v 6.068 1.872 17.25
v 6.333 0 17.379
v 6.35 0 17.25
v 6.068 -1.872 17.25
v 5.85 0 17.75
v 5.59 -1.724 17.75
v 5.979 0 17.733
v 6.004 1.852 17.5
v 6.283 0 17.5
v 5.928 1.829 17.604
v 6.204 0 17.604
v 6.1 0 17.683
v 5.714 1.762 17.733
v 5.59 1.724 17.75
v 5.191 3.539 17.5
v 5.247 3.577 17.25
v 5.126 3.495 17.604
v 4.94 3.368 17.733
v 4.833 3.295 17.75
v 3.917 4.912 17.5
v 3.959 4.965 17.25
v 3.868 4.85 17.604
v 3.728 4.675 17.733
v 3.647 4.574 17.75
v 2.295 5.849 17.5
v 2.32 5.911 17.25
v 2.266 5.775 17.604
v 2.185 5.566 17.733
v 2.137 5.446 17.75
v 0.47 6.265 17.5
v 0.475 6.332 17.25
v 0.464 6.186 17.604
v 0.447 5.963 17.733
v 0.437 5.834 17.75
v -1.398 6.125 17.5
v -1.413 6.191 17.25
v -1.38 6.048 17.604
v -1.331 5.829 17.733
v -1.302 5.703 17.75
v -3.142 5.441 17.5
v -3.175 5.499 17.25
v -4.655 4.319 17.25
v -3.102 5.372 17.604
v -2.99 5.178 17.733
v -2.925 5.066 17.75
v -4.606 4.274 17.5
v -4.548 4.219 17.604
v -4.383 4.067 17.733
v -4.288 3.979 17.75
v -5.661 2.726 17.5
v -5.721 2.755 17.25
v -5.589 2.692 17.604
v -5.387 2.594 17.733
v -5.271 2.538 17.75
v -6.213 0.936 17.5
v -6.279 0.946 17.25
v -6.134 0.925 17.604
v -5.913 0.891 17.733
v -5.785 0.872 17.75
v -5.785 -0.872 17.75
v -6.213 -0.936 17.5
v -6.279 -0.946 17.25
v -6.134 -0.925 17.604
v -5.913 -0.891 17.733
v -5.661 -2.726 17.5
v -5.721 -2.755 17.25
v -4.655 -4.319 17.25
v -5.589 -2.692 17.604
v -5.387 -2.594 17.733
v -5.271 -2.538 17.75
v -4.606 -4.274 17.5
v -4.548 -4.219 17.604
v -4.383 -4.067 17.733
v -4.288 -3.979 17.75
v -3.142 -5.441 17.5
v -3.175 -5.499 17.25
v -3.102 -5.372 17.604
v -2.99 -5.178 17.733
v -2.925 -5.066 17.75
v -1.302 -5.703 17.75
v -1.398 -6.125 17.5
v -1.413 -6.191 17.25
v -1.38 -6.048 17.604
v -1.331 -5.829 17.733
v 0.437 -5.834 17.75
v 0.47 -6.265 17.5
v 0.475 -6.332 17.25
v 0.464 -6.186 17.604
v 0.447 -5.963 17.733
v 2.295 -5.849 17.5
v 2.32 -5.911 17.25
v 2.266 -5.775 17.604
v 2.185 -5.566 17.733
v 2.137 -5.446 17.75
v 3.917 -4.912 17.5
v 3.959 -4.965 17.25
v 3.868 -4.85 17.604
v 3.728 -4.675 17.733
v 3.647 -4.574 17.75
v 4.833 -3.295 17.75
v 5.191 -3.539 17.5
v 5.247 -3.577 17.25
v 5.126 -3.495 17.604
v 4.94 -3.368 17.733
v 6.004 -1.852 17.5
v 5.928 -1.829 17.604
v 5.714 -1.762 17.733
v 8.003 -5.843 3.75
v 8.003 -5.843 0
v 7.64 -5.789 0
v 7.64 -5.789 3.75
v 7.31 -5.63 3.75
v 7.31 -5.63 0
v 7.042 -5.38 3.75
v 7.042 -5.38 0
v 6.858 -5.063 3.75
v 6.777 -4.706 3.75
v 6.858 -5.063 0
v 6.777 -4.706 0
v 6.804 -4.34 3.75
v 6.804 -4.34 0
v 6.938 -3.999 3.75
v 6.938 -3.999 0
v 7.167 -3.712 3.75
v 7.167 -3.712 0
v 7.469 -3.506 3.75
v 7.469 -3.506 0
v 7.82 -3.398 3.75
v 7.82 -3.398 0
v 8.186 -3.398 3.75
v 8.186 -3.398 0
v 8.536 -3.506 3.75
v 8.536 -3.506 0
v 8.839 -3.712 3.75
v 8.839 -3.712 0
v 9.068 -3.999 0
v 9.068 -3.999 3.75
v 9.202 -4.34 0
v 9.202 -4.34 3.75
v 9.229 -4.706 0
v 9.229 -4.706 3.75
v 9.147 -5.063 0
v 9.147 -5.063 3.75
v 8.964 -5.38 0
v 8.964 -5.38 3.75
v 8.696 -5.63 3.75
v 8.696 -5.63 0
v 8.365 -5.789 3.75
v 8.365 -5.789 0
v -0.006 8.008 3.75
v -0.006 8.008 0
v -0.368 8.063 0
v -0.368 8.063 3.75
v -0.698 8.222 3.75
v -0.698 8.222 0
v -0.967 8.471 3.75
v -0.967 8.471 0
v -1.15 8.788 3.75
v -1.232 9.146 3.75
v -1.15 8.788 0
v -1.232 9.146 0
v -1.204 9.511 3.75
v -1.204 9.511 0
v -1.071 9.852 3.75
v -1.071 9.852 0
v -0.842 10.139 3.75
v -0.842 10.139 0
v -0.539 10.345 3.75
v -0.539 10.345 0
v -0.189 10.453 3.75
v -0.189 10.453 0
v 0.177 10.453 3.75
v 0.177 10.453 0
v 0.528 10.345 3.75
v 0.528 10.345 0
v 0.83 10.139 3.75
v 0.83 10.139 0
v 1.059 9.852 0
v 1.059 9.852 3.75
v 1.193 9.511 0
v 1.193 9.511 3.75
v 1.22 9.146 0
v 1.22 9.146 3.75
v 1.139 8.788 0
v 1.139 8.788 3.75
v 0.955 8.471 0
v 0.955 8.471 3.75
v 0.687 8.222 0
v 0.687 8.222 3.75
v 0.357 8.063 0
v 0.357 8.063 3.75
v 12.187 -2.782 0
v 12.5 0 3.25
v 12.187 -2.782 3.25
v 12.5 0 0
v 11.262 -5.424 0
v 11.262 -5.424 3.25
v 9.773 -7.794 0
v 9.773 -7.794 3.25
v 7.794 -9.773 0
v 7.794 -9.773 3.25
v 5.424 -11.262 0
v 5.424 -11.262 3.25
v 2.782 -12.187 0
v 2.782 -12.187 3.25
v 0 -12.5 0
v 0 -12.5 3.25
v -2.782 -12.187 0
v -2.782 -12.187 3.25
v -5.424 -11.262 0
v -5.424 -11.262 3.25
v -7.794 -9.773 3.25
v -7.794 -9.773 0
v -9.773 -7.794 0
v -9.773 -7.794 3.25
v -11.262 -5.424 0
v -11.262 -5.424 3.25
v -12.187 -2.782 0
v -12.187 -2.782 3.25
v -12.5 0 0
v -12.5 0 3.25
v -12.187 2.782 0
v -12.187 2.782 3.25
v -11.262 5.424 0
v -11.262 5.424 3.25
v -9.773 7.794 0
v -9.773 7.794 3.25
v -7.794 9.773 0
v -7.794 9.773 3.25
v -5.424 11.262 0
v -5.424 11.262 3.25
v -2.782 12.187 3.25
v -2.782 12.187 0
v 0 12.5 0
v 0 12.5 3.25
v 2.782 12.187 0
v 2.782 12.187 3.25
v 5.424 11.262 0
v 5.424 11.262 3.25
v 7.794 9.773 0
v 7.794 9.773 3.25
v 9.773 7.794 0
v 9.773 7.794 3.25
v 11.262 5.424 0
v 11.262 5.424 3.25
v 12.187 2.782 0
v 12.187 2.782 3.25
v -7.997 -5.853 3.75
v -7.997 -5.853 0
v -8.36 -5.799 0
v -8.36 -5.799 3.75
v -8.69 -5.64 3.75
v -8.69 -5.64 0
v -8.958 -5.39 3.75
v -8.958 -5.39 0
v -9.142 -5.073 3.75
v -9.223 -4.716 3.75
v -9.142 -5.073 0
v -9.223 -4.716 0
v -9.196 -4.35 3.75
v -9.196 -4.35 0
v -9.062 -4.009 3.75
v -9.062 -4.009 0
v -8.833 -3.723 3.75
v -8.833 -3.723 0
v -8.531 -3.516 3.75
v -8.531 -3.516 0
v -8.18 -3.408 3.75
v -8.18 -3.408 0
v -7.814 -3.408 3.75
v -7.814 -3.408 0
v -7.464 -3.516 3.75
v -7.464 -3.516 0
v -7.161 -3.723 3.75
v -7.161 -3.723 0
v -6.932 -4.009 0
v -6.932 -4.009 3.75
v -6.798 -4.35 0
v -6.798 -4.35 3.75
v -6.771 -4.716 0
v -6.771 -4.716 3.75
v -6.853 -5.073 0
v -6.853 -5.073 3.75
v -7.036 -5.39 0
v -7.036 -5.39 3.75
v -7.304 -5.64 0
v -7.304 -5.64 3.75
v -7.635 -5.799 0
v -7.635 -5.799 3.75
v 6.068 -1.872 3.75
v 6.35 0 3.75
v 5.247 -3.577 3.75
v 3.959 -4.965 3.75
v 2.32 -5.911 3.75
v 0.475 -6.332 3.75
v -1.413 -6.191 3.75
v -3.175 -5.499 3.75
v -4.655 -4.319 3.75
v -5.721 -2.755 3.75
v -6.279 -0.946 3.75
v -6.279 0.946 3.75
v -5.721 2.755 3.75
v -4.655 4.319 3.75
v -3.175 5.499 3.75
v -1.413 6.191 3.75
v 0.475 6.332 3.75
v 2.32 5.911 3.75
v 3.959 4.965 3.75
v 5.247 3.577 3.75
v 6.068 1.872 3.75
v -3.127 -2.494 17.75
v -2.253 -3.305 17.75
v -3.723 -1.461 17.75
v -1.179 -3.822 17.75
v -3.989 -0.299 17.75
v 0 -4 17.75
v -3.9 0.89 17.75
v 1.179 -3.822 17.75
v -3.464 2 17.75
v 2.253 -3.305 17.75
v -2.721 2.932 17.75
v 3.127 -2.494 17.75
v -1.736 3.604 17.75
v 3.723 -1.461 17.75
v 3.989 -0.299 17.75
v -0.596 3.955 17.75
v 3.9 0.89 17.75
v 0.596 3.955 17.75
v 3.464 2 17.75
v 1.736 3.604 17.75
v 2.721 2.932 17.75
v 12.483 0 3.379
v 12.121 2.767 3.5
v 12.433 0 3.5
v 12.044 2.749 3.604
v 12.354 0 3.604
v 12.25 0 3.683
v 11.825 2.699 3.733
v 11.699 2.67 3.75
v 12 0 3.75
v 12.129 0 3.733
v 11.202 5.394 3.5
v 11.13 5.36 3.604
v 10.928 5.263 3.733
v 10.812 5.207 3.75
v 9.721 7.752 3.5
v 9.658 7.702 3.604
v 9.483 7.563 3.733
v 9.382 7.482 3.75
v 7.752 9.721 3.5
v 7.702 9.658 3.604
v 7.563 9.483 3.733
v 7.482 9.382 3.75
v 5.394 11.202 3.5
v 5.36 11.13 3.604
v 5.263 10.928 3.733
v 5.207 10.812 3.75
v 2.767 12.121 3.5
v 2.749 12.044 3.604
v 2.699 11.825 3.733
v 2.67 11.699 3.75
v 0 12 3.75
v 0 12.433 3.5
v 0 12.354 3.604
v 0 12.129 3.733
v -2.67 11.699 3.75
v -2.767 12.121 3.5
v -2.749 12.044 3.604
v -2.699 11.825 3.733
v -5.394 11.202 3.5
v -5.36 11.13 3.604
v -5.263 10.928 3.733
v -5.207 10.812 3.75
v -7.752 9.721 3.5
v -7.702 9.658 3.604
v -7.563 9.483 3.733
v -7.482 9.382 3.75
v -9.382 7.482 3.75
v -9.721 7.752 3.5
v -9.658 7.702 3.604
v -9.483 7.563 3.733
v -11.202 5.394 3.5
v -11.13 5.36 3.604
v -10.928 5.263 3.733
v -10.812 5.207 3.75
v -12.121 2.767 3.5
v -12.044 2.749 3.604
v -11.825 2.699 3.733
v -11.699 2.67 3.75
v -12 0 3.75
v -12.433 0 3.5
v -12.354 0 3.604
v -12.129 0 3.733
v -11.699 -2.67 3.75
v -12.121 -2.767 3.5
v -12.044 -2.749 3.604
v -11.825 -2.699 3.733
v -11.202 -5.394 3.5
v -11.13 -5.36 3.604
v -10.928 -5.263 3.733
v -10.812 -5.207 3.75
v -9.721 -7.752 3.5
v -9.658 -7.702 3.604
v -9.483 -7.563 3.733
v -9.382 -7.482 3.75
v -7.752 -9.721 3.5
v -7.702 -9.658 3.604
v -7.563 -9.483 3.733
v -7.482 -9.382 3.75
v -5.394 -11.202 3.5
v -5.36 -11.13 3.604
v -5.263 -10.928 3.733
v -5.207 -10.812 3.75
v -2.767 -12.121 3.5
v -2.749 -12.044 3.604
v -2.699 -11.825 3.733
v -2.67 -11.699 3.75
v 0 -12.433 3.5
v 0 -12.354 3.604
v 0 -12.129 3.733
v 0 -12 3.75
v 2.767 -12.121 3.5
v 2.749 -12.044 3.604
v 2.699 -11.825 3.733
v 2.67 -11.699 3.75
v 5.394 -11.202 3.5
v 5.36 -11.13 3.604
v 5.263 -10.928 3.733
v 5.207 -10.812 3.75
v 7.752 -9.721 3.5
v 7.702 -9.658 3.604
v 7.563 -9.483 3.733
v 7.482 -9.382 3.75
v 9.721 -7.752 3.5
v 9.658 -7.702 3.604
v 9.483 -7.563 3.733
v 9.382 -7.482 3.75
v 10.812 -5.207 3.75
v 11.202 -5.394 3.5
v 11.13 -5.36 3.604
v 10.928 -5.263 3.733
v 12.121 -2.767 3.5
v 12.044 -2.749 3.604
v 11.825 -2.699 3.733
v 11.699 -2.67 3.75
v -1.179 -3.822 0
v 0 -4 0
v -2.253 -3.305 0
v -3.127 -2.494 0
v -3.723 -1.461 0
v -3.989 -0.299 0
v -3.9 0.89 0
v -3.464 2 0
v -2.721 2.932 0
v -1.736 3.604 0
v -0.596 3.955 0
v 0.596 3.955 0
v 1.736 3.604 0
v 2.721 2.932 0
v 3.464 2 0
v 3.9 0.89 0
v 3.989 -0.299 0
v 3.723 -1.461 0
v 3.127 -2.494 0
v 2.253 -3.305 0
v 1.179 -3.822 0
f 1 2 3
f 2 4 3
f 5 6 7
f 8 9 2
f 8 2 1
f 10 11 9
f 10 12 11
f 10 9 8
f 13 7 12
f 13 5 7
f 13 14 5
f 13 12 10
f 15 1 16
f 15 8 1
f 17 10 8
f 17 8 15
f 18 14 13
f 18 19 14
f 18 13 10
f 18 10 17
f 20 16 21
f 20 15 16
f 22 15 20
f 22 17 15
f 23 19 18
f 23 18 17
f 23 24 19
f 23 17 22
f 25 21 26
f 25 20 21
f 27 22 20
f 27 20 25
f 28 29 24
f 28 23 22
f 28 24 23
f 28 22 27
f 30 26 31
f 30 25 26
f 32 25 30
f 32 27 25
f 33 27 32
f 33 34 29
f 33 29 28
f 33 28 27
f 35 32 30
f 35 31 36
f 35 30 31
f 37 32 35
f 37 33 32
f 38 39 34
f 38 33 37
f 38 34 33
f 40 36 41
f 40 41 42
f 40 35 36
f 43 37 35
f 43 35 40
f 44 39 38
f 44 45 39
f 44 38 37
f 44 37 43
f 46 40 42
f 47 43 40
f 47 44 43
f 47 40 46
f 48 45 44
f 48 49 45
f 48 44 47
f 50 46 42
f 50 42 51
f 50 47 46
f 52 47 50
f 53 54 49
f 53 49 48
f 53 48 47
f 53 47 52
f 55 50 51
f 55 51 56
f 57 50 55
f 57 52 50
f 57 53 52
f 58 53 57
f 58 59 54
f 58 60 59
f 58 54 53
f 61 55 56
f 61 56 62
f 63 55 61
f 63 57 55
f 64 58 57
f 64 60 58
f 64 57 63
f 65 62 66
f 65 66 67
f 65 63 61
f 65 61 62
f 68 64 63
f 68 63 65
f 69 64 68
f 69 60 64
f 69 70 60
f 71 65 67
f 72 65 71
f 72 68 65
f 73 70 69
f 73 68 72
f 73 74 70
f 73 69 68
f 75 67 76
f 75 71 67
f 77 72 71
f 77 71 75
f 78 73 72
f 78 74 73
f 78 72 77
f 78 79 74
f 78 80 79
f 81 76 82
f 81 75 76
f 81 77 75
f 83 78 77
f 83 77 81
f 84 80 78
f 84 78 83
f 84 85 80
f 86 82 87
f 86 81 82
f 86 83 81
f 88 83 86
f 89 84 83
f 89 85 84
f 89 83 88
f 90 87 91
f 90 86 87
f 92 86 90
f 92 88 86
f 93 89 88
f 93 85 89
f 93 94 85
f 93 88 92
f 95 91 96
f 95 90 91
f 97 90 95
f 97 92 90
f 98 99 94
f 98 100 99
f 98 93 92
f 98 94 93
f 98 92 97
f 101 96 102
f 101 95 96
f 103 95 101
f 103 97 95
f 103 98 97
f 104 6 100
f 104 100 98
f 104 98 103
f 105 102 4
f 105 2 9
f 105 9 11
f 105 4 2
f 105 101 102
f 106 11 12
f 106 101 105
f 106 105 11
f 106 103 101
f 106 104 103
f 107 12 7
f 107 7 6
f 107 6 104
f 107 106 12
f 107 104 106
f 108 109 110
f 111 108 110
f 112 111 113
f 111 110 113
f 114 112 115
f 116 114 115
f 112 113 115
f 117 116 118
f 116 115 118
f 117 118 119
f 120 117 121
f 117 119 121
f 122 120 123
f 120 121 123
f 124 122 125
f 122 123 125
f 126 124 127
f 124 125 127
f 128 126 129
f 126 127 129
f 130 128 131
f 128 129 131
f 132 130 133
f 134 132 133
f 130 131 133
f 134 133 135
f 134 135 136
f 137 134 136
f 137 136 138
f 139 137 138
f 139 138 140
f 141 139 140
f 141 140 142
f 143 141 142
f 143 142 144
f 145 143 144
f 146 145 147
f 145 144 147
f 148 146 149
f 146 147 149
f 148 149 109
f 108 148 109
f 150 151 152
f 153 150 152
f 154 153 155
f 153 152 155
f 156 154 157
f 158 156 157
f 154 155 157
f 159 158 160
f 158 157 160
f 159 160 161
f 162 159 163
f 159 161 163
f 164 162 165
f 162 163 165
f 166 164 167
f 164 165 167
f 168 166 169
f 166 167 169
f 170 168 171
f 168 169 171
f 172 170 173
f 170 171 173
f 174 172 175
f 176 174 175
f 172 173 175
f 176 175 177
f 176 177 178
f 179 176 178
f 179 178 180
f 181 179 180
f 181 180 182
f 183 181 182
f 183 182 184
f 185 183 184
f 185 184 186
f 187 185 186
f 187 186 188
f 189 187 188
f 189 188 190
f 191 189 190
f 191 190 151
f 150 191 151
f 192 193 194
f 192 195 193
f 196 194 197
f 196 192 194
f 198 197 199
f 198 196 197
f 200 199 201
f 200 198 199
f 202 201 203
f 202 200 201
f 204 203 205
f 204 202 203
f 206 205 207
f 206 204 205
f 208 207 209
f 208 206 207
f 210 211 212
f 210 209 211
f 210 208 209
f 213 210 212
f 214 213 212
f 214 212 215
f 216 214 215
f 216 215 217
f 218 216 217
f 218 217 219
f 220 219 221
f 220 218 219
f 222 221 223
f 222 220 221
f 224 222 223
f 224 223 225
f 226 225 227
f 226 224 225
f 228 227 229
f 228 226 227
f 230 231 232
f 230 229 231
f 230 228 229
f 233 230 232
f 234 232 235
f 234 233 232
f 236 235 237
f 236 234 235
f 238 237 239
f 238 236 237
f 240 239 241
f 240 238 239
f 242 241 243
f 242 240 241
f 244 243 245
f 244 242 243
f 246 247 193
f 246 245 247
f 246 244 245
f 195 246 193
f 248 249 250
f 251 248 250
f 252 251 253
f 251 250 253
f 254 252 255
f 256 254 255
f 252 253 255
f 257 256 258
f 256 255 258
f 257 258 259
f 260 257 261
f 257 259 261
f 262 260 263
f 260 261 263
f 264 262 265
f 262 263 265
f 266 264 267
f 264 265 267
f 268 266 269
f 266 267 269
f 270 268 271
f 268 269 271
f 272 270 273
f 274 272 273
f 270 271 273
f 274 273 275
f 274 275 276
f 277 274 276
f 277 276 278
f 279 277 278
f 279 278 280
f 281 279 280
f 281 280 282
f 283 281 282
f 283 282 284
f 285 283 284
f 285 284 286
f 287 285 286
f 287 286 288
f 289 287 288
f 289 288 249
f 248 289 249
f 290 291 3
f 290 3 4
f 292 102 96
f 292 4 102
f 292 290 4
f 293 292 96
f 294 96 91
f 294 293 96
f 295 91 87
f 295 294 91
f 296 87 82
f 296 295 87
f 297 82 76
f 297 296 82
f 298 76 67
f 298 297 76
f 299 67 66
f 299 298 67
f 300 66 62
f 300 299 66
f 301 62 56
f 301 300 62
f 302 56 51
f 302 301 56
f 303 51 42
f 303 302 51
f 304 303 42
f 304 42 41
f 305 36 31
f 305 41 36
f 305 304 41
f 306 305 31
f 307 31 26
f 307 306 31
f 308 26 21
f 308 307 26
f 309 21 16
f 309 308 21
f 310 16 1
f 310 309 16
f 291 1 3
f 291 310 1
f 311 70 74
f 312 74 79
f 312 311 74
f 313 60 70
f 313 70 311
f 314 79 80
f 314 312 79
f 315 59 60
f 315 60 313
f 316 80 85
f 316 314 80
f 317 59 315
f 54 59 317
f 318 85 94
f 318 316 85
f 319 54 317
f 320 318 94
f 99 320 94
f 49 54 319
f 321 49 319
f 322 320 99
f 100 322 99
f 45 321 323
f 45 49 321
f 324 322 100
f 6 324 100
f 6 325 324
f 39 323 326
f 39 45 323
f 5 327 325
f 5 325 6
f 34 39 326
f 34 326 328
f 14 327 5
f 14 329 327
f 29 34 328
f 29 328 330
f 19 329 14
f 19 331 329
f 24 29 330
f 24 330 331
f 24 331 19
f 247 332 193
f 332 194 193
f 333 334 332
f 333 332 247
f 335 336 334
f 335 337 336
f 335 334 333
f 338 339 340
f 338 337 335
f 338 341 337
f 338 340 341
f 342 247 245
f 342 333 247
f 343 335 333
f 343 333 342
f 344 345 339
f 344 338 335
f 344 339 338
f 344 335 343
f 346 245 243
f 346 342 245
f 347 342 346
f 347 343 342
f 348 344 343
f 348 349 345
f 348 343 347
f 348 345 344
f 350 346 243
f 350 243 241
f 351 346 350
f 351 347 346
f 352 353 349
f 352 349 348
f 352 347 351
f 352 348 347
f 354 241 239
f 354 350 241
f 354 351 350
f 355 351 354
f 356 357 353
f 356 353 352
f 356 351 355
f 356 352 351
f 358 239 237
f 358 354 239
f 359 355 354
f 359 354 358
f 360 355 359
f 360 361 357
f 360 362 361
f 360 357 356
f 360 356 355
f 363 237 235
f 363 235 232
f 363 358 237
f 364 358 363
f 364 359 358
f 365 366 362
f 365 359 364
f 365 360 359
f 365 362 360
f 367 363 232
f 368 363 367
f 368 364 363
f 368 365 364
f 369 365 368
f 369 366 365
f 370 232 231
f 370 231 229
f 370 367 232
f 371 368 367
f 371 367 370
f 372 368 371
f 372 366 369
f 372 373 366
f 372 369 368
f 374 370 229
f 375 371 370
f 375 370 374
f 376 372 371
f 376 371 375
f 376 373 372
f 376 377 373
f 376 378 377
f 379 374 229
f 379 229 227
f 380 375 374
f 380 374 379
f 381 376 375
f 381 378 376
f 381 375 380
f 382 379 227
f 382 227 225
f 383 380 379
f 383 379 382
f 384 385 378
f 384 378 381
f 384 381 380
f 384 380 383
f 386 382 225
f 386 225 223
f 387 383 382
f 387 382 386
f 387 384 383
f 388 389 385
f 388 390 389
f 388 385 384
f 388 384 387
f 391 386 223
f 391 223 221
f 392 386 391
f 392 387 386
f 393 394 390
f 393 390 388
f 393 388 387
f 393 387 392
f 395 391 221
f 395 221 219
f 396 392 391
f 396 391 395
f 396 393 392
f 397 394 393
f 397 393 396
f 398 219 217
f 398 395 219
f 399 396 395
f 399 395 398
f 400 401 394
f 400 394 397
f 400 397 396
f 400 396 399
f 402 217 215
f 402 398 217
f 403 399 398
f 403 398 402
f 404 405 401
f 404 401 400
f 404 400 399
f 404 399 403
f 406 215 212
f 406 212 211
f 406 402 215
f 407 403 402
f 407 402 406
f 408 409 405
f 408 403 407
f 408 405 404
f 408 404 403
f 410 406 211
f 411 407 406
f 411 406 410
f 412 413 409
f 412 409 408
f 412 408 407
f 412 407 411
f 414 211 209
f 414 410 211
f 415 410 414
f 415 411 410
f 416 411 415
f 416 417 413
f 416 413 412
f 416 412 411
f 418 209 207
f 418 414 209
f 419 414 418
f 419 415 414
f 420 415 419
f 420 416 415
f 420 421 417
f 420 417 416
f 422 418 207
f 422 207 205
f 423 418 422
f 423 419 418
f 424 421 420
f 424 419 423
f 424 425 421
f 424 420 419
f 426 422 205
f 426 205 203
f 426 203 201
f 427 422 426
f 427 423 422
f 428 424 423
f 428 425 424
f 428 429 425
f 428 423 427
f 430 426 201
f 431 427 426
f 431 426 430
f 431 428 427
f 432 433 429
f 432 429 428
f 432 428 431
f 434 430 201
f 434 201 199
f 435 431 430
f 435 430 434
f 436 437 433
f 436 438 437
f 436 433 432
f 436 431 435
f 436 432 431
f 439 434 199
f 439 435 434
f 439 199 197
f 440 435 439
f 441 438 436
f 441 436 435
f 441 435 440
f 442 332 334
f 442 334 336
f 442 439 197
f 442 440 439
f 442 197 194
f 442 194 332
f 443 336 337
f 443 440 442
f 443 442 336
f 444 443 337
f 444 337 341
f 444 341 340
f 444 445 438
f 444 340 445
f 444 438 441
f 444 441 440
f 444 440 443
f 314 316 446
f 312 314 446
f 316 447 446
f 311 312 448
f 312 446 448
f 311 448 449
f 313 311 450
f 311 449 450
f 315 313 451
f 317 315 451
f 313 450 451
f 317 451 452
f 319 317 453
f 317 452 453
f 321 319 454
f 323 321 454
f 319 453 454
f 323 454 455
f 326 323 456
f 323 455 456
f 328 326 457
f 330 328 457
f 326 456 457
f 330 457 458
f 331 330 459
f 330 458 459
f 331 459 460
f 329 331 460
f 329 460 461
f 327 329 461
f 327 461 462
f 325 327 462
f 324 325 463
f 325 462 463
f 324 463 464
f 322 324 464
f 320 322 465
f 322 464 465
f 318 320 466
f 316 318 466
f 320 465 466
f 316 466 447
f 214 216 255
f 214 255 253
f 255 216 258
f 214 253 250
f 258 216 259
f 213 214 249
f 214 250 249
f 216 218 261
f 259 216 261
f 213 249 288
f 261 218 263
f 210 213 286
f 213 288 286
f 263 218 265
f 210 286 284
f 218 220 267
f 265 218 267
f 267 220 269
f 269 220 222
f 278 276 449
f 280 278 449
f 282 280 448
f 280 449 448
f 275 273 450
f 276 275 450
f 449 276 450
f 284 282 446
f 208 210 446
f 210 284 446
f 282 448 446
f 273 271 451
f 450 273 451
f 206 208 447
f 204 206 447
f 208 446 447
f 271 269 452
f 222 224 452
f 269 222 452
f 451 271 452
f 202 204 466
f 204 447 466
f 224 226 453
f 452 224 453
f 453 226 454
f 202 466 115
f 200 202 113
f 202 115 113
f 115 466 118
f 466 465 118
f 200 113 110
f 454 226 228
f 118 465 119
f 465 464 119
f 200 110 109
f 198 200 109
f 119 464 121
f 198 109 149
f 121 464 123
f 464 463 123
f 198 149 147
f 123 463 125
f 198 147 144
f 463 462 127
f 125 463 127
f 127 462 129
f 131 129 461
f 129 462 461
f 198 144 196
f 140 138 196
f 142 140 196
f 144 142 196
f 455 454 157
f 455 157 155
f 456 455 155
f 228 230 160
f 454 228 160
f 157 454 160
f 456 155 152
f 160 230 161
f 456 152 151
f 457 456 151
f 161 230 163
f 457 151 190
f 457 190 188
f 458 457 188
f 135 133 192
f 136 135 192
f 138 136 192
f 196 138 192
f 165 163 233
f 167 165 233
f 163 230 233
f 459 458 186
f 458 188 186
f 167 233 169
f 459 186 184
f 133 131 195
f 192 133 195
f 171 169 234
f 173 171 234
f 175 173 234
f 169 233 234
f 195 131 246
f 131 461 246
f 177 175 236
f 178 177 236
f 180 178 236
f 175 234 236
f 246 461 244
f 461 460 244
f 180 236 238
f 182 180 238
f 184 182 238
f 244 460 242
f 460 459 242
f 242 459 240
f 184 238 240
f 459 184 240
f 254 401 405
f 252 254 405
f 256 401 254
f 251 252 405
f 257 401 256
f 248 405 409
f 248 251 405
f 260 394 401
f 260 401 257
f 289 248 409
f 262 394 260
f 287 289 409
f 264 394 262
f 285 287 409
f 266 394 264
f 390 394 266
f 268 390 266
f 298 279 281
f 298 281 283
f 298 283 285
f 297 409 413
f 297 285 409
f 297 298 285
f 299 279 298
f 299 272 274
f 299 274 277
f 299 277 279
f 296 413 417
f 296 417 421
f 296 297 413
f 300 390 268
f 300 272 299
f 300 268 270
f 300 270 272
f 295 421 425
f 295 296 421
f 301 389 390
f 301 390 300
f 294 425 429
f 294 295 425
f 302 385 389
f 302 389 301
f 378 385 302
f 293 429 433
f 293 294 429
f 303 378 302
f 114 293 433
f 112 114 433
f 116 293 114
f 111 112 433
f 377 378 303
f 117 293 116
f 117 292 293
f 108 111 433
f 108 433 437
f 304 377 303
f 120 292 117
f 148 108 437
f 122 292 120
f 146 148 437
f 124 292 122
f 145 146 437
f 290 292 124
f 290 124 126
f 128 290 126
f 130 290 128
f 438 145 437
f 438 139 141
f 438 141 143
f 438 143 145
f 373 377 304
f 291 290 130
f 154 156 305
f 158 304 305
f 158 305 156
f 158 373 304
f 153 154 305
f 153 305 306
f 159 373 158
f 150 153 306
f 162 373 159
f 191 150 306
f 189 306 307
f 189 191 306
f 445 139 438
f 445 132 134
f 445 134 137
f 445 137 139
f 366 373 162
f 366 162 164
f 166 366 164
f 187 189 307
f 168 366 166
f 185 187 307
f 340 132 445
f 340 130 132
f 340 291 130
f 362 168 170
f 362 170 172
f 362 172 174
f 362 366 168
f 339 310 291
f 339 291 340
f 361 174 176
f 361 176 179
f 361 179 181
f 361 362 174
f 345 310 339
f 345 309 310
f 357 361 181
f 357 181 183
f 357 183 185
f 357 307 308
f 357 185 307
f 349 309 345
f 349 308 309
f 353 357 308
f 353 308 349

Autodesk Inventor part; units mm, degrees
ref_plane "YZ Plane" through (0, 0, 0) normal (1, 0, 0) x (0, 1, 0)
ref_plane "XZ Plane" through (0, 0, 0) normal (0, 1, 0) x (-1, 0, 0)
ref_plane "XY Plane" through (0, 0, 0) normal (0, 0, 1) x (1, 0, 0)
sketch "Sketch1" plane through (0, 0, 0) normal (0, 0, 1) x (1, 0, 0)
  circle A0 centre (0, 0) radius 12.5
  dimension "d0" = 25
extrude "Extrusion1" add sketch "Sketch1" along normal blind 3.75
sketch "Sketch2" plane through (0, 0, 3.75) normal (0, 0, 1) x (1, 0, 0)
  circle A0 centre (0, 0) radius 12.5 projected
  circle A1 centre (0, 0) radius 6.35
  dimension "d3" = 12.7
extrude "Extrusion2" add sketch "Sketch2" along normal blind 14 contours A1
sketch "Sketch3" plane through (0, 0, 17.75) normal (0, 0, 1) x (1, 0, 0)
  circle A0 centre (0, 0) radius 6.35 projected
hole "Hole1" at (0, 0, 17.75) direction (0, 0, -1) diameter 8 end through all
sketch "Sketch4" plane through (0, 0, 3.75) normal (0, 0, 1) x (1, 0, 0)
  circle A0 centre (0, 0) radius 12.5 projected
  line L0 (-7.9971, -4.6239) -> (-0.0058, 9.2376) construction
  line L1 (-0.0058, 9.2376) -> (8.0029, -4.6137) construction
  line L2 (8.0029, -4.6137) -> (-7.9971, -4.6239) construction
  circle A1 centre (0, 0) radius 9.2376 construction
  dimension "d13" = 16
hole "Hole2" at (-7.9971, -4.6239, 3.75) at (-0.0058, 9.2376, 3.75) at (8.0029, -4.6137, 3.75) direction (0, 0, -1) diameter 2.459 end through all thread size "M3x0.5" class "6H" standard "ANSI Metric M Profile"
fillet "Fillet1" radius 0.5 2 edges at (-12.5, 0, 3.75) (-6.35, 0, 17.75)
properties part number "lead carriage"
